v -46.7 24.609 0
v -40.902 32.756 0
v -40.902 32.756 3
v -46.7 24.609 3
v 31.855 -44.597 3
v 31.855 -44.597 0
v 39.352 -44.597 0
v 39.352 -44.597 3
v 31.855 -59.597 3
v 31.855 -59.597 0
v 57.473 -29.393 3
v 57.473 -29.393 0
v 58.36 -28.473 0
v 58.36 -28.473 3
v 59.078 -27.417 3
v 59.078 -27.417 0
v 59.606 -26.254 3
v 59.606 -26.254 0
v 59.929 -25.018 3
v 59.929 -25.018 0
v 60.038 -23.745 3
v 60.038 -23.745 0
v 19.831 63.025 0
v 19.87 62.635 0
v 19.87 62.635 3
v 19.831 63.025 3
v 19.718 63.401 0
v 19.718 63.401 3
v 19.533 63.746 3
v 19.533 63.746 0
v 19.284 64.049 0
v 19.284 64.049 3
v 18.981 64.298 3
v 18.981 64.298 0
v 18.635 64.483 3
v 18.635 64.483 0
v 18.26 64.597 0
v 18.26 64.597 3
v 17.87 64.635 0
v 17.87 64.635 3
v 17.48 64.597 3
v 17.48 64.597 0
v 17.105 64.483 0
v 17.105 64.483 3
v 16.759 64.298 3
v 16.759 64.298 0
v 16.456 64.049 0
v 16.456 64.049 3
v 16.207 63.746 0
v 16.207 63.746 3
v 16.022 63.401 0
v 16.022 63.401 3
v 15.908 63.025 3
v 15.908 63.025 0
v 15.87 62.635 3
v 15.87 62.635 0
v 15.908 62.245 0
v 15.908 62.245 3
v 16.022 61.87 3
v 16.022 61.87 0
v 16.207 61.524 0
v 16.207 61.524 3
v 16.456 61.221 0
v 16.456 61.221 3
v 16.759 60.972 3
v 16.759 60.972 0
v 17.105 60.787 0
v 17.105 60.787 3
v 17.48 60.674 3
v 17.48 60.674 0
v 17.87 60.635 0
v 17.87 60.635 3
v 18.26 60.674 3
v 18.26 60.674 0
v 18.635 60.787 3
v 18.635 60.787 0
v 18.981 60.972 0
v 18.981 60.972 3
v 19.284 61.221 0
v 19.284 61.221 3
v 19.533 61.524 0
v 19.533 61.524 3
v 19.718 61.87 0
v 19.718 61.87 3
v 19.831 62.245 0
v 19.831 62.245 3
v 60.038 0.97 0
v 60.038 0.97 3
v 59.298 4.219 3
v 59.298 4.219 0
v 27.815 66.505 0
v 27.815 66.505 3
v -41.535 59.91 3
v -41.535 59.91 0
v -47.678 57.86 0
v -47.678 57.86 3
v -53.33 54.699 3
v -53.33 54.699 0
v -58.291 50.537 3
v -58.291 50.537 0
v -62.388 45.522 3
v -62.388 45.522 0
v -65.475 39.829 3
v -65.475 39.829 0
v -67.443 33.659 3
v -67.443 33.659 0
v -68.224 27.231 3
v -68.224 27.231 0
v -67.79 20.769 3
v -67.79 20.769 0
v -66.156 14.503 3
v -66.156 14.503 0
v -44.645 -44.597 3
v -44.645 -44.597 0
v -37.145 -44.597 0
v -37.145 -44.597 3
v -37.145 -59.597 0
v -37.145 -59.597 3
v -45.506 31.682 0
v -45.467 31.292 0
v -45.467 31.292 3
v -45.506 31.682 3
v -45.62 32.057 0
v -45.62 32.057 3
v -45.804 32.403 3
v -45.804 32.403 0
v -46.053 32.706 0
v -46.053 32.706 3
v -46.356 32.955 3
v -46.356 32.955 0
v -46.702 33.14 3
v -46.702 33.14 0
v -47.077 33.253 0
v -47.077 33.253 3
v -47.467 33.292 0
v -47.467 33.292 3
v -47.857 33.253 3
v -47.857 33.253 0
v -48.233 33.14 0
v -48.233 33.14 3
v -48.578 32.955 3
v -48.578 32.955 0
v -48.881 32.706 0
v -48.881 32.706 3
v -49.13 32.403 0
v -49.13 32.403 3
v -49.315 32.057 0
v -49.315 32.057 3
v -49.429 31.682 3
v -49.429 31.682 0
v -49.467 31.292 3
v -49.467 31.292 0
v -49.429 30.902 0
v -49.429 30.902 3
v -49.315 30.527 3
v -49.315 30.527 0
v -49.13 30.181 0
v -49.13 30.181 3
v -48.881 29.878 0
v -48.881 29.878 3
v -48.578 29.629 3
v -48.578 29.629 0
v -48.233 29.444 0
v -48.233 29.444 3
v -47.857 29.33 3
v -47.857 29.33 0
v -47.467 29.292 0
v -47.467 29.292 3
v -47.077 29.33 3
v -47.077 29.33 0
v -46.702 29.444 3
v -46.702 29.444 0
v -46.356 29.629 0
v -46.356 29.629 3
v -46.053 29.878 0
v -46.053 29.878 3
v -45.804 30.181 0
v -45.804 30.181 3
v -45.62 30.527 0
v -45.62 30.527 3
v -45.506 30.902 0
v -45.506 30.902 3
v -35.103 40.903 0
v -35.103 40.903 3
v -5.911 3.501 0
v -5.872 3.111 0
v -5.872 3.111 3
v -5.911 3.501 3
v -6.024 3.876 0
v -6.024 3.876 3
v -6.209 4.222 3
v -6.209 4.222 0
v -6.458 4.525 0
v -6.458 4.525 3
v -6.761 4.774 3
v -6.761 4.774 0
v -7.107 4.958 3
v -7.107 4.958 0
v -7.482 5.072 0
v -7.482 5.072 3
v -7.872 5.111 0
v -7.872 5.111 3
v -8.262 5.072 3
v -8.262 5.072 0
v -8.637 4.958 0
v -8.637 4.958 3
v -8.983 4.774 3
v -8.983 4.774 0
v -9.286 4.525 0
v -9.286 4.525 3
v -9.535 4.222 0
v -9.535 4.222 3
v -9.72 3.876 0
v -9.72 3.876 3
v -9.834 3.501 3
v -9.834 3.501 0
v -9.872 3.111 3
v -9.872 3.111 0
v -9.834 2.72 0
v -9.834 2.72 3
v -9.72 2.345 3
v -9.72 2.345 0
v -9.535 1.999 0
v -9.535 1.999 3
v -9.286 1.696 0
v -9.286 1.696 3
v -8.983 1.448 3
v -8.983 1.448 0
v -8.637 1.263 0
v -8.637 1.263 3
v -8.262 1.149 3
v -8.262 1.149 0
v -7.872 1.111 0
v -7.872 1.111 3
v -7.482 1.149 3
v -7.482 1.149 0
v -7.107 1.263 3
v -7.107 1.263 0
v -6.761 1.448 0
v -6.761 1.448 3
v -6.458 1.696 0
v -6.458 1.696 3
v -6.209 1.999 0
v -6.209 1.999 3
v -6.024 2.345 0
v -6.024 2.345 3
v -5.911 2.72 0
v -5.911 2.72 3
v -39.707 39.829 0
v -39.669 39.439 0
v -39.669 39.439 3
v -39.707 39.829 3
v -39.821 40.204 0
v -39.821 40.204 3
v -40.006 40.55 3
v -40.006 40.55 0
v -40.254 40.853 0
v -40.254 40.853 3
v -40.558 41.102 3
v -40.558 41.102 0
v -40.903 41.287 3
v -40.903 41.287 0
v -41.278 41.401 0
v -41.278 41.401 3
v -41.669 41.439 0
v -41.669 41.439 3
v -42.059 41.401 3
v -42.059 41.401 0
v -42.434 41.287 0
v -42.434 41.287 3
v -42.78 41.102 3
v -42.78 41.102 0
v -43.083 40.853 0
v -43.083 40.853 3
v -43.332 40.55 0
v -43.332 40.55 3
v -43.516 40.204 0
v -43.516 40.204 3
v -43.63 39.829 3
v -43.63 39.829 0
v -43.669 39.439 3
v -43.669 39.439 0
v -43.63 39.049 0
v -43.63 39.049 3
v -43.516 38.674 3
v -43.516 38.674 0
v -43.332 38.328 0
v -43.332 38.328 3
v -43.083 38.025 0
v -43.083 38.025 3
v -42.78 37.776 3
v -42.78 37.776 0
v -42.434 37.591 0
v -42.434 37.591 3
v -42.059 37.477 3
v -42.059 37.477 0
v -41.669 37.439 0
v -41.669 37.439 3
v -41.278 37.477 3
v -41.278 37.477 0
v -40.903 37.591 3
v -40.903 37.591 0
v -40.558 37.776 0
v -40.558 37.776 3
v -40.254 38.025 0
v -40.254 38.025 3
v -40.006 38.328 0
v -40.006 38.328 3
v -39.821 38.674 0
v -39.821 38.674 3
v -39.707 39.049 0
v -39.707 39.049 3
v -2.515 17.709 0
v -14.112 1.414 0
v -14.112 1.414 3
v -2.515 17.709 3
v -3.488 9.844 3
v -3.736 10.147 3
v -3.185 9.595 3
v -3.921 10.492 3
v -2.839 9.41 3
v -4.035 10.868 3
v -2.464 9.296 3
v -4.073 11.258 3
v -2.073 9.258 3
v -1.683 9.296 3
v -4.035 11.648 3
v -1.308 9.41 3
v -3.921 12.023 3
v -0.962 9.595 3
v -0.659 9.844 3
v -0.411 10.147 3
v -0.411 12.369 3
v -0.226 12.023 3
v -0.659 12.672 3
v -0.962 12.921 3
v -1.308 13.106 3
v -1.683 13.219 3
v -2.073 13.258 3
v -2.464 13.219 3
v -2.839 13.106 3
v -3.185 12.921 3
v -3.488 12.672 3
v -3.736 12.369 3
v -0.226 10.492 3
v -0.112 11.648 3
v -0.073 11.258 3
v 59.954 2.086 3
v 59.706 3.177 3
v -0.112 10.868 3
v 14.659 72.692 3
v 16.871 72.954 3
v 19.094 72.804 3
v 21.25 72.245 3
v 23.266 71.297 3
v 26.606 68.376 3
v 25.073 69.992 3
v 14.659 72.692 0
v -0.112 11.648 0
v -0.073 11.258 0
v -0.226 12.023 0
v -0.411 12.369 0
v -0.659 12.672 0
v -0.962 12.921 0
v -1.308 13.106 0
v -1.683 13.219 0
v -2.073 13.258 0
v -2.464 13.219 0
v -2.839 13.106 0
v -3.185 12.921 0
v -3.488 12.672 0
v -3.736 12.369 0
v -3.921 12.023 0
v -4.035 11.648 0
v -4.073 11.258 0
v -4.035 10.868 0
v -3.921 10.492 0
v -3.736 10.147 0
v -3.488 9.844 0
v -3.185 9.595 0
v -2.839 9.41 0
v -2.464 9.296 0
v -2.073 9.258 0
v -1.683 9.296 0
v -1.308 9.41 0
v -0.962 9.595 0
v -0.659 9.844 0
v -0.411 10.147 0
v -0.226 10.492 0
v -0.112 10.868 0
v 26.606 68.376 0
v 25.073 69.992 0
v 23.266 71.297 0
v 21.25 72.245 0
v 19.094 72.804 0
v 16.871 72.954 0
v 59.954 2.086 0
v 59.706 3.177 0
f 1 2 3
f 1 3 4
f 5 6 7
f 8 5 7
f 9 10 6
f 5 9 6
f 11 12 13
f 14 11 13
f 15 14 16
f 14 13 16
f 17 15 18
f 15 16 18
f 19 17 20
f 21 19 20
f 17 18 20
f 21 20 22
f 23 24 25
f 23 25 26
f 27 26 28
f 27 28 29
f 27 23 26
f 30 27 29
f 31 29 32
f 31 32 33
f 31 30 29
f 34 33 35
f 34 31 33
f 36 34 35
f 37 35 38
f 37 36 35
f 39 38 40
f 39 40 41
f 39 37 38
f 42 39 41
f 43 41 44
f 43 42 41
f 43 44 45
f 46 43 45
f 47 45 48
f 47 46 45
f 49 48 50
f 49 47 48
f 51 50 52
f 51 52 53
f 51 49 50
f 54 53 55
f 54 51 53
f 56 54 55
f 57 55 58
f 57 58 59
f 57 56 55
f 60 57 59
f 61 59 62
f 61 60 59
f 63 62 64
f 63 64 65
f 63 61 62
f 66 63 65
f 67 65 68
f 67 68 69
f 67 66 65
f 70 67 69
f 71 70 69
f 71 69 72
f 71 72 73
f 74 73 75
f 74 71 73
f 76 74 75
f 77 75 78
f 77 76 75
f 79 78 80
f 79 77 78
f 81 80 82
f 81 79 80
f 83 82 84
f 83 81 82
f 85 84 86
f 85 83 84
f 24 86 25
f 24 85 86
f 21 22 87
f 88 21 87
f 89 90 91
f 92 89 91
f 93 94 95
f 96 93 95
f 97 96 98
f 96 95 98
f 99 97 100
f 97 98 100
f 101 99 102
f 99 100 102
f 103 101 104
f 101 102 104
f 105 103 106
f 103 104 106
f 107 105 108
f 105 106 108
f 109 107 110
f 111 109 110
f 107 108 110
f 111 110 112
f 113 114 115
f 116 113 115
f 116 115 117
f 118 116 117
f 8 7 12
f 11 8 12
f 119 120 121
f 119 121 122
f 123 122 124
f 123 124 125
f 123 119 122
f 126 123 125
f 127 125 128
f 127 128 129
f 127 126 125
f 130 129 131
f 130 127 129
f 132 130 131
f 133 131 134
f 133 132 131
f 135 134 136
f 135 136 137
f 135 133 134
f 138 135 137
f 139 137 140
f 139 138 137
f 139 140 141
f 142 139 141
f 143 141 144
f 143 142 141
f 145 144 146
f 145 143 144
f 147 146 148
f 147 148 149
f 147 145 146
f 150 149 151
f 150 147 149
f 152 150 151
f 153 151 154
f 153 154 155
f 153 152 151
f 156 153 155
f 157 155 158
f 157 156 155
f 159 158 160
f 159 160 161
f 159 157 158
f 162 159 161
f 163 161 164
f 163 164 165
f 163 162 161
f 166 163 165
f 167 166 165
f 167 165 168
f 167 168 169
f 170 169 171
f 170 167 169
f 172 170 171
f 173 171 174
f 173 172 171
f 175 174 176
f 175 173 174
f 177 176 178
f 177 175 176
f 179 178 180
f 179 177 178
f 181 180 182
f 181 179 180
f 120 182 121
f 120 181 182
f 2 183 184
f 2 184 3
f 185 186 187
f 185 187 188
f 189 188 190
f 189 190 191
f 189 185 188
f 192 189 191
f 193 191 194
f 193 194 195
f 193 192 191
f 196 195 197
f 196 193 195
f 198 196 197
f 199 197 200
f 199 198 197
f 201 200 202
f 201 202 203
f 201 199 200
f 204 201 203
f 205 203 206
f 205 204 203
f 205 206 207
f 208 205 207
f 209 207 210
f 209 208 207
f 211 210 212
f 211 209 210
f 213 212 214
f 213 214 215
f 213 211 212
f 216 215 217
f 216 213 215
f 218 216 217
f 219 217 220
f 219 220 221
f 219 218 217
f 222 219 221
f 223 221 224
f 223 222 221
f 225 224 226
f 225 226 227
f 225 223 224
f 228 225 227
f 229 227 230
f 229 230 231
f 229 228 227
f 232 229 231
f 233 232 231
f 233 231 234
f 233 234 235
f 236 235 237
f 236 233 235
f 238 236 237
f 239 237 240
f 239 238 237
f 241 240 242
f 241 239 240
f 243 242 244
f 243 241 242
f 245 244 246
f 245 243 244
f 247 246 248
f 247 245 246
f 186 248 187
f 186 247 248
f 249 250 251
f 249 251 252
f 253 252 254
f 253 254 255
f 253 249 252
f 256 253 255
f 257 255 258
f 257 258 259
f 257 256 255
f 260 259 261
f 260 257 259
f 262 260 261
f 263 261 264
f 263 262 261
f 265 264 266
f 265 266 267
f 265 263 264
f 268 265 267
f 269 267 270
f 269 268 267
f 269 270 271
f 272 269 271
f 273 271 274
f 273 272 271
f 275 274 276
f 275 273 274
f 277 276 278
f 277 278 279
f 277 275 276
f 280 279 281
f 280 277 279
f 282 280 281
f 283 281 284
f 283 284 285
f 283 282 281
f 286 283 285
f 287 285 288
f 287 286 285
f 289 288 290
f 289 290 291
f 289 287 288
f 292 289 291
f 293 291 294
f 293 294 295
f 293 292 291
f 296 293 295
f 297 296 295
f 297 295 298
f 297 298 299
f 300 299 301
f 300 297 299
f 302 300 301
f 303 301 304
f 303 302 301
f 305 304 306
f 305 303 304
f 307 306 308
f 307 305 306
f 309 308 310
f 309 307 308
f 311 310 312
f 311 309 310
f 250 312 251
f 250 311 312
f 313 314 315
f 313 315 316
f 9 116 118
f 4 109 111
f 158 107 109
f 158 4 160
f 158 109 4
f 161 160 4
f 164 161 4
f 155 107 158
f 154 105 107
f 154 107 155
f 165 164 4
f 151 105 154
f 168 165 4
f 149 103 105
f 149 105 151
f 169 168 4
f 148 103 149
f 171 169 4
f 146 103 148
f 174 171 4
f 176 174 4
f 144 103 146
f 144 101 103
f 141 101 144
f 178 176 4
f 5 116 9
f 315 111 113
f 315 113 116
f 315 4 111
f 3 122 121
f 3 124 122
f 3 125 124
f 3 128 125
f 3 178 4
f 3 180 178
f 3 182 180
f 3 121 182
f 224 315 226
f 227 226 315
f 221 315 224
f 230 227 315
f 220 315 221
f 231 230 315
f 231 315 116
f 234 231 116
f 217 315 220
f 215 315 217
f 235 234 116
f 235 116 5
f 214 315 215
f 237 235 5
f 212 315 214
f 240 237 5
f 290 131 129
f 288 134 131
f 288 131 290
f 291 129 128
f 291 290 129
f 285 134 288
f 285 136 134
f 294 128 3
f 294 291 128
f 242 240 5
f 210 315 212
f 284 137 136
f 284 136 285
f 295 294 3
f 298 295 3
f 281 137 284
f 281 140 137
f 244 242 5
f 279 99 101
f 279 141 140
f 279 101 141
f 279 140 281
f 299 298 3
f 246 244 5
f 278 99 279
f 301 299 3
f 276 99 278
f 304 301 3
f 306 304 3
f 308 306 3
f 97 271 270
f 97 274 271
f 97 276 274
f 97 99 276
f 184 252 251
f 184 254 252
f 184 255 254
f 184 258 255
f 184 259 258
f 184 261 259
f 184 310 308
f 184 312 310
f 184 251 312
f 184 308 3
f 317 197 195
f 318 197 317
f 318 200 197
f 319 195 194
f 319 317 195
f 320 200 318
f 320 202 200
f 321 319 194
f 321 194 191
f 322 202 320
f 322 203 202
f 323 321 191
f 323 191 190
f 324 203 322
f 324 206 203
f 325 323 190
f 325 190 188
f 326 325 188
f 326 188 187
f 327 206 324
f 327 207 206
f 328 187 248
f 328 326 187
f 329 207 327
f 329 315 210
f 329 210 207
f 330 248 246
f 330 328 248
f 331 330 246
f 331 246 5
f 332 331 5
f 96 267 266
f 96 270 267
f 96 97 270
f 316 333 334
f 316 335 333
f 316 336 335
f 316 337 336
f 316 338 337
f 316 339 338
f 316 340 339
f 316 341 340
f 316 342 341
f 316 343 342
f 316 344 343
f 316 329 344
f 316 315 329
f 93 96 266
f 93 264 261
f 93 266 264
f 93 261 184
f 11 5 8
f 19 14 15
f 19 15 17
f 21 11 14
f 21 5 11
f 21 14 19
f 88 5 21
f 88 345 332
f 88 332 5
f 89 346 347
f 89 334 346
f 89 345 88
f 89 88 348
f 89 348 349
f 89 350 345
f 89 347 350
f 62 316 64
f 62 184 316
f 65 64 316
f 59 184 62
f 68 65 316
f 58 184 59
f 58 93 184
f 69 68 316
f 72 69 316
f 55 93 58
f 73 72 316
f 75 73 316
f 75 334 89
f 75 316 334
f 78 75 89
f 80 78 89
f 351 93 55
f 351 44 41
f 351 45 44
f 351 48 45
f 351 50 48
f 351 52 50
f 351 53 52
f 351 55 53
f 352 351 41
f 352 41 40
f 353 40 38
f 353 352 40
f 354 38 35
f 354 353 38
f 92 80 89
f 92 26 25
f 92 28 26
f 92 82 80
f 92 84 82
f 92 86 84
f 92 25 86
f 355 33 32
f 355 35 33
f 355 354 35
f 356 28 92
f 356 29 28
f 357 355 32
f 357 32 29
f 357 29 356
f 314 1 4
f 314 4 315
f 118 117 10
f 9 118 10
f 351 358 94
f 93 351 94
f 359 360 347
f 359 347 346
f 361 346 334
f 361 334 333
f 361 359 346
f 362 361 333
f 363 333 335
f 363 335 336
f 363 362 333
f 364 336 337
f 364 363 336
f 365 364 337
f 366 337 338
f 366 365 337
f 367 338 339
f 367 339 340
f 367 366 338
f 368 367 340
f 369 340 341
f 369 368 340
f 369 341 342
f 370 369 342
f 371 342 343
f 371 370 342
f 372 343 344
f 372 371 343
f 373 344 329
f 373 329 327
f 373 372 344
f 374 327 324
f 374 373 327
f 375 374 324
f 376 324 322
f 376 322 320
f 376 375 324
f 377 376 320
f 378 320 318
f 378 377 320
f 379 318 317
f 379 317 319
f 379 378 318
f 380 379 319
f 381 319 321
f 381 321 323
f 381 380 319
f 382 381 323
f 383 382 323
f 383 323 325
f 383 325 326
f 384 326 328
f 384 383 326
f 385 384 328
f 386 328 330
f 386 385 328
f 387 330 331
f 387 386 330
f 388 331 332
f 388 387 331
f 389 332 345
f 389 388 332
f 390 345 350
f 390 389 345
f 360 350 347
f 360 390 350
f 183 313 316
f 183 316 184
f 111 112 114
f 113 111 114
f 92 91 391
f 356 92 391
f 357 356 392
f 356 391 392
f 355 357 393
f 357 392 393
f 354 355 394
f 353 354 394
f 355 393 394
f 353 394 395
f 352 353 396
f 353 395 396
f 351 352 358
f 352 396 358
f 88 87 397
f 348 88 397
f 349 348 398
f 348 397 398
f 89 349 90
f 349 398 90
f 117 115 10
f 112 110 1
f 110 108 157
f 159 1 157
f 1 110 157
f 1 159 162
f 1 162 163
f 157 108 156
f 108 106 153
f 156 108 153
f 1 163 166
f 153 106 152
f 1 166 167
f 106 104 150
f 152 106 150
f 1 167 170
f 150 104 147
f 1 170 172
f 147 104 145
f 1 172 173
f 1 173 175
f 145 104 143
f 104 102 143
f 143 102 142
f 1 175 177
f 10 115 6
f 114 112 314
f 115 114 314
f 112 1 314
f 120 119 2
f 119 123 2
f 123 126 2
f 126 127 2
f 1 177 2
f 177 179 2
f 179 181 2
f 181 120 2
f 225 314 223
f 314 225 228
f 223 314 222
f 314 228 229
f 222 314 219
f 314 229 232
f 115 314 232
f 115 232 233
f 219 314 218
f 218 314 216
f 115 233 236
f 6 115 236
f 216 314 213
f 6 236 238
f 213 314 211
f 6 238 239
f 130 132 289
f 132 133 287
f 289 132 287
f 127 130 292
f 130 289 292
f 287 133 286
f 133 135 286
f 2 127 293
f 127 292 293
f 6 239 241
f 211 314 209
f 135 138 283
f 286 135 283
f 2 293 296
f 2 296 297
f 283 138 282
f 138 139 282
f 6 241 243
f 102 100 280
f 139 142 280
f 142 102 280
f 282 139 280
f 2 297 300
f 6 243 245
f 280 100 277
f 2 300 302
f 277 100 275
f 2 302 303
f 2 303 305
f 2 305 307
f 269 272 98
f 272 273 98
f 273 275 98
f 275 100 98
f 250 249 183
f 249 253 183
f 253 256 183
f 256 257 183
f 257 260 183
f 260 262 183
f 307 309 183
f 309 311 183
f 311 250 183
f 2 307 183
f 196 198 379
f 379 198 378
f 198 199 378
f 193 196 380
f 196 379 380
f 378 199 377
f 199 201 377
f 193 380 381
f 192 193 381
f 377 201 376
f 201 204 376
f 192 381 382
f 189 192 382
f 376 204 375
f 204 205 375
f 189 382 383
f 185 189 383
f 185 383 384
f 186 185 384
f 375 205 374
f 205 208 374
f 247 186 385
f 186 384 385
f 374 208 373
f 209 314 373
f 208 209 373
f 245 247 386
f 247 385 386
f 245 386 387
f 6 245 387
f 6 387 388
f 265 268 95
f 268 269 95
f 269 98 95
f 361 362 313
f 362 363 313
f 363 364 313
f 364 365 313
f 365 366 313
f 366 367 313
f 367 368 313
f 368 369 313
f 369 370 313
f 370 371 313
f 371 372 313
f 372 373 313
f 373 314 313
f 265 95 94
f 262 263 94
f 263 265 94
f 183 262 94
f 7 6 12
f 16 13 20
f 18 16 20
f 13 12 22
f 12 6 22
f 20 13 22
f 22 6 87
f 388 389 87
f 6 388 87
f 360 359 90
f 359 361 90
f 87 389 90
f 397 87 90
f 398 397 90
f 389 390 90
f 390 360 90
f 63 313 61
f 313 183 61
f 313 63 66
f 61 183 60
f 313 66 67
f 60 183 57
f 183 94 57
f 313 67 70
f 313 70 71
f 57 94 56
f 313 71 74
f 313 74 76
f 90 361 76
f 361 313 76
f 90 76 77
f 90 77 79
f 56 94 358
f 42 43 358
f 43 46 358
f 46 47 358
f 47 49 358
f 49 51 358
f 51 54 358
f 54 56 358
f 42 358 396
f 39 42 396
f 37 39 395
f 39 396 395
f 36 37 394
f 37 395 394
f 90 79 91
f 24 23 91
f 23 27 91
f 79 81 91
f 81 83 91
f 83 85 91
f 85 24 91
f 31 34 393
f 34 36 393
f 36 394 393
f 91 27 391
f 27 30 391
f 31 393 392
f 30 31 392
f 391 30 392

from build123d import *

# Parameters (mm, degrees)
SKETCH_1_R      = 2
EXTRUDE_1_DEPTH = 3


with BuildPart() as part:
    # 草圖1 → 填料-伸長1 (new body)
    with BuildSketch(Plane.XY):
        with BuildLine():
            Line((59.29779344, 4.218826045), (27.815049638, 66.504924261))
            ThreePointArc((27.815049638, 66.504924261), (22.280452319, 71.817413106), (14.658767156, 72.691610154))
            Line((14.658767156, 72.691610154), (-41.535085268, 59.909886888))
            ThreePointArc((-41.535085268, 59.909886888), (-64.065081782, 42.747842637), (-66.156088343, 14.503122823))
            Line((-66.156088343, 14.503122823), (-44.645241189, -44.597442609))
            Line((-44.645241189, -44.597442609), (-37.145243156, -44.597442609))
            Line((-37.145243156, -44.597442609), (-37.145243156, -59.597442609))
            Line((-37.145243156, -59.597442609), (31.854756844, -59.597442609))
            Line((31.854756844, -59.597442609), (31.854756844, -44.597442609))
            Line((31.854756844, -44.597442609), (39.352422835, -44.597442609))
            Line((39.352422835, -44.597442609), (57.472801714, -29.392639375))
            ThreePointArc((57.472801714, -29.392639375), (59.36662348, -26.84637358), (60.037958839, -23.74486762))
            Line((60.037958839, -23.74486762), (60.037958839, 0.970036375))
            ThreePointArc((60.037958839, 0.970036375), (59.850576653, 2.636055511), (59.29779344, 4.218826045))
        make_face()
        with Locations((17.869885774, 62.635186946)):
            Circle(SKETCH_1_R, mode=Mode.SUBTRACT)
        with Locations((-2.073498249, 11.257790191)):
            Circle(SKETCH_1_R, mode=Mode.SUBTRACT)
        with Locations((-7.872108914, 3.110636432)):
            Circle(SKETCH_1_R, mode=Mode.SUBTRACT)
        with Locations((-41.668665513, 39.439038022)):
            Circle(SKETCH_1_R, mode=Mode.SUBTRACT)
        with Locations((-47.467276178, 31.291884264)):
            Circle(SKETCH_1_R, mode=Mode.SUBTRACT)
        Polygon((-40.901751655, 32.756086344), (-46.700362319, 24.608932586), (-14.111747287, 1.414489926), (-2.514525958, 17.708797442), (-35.10314099, 40.903240102), align=None, mode=Mode.SUBTRACT)
    extrude(amount=EXTRUDE_1_DEPTH)


solid = part.part
